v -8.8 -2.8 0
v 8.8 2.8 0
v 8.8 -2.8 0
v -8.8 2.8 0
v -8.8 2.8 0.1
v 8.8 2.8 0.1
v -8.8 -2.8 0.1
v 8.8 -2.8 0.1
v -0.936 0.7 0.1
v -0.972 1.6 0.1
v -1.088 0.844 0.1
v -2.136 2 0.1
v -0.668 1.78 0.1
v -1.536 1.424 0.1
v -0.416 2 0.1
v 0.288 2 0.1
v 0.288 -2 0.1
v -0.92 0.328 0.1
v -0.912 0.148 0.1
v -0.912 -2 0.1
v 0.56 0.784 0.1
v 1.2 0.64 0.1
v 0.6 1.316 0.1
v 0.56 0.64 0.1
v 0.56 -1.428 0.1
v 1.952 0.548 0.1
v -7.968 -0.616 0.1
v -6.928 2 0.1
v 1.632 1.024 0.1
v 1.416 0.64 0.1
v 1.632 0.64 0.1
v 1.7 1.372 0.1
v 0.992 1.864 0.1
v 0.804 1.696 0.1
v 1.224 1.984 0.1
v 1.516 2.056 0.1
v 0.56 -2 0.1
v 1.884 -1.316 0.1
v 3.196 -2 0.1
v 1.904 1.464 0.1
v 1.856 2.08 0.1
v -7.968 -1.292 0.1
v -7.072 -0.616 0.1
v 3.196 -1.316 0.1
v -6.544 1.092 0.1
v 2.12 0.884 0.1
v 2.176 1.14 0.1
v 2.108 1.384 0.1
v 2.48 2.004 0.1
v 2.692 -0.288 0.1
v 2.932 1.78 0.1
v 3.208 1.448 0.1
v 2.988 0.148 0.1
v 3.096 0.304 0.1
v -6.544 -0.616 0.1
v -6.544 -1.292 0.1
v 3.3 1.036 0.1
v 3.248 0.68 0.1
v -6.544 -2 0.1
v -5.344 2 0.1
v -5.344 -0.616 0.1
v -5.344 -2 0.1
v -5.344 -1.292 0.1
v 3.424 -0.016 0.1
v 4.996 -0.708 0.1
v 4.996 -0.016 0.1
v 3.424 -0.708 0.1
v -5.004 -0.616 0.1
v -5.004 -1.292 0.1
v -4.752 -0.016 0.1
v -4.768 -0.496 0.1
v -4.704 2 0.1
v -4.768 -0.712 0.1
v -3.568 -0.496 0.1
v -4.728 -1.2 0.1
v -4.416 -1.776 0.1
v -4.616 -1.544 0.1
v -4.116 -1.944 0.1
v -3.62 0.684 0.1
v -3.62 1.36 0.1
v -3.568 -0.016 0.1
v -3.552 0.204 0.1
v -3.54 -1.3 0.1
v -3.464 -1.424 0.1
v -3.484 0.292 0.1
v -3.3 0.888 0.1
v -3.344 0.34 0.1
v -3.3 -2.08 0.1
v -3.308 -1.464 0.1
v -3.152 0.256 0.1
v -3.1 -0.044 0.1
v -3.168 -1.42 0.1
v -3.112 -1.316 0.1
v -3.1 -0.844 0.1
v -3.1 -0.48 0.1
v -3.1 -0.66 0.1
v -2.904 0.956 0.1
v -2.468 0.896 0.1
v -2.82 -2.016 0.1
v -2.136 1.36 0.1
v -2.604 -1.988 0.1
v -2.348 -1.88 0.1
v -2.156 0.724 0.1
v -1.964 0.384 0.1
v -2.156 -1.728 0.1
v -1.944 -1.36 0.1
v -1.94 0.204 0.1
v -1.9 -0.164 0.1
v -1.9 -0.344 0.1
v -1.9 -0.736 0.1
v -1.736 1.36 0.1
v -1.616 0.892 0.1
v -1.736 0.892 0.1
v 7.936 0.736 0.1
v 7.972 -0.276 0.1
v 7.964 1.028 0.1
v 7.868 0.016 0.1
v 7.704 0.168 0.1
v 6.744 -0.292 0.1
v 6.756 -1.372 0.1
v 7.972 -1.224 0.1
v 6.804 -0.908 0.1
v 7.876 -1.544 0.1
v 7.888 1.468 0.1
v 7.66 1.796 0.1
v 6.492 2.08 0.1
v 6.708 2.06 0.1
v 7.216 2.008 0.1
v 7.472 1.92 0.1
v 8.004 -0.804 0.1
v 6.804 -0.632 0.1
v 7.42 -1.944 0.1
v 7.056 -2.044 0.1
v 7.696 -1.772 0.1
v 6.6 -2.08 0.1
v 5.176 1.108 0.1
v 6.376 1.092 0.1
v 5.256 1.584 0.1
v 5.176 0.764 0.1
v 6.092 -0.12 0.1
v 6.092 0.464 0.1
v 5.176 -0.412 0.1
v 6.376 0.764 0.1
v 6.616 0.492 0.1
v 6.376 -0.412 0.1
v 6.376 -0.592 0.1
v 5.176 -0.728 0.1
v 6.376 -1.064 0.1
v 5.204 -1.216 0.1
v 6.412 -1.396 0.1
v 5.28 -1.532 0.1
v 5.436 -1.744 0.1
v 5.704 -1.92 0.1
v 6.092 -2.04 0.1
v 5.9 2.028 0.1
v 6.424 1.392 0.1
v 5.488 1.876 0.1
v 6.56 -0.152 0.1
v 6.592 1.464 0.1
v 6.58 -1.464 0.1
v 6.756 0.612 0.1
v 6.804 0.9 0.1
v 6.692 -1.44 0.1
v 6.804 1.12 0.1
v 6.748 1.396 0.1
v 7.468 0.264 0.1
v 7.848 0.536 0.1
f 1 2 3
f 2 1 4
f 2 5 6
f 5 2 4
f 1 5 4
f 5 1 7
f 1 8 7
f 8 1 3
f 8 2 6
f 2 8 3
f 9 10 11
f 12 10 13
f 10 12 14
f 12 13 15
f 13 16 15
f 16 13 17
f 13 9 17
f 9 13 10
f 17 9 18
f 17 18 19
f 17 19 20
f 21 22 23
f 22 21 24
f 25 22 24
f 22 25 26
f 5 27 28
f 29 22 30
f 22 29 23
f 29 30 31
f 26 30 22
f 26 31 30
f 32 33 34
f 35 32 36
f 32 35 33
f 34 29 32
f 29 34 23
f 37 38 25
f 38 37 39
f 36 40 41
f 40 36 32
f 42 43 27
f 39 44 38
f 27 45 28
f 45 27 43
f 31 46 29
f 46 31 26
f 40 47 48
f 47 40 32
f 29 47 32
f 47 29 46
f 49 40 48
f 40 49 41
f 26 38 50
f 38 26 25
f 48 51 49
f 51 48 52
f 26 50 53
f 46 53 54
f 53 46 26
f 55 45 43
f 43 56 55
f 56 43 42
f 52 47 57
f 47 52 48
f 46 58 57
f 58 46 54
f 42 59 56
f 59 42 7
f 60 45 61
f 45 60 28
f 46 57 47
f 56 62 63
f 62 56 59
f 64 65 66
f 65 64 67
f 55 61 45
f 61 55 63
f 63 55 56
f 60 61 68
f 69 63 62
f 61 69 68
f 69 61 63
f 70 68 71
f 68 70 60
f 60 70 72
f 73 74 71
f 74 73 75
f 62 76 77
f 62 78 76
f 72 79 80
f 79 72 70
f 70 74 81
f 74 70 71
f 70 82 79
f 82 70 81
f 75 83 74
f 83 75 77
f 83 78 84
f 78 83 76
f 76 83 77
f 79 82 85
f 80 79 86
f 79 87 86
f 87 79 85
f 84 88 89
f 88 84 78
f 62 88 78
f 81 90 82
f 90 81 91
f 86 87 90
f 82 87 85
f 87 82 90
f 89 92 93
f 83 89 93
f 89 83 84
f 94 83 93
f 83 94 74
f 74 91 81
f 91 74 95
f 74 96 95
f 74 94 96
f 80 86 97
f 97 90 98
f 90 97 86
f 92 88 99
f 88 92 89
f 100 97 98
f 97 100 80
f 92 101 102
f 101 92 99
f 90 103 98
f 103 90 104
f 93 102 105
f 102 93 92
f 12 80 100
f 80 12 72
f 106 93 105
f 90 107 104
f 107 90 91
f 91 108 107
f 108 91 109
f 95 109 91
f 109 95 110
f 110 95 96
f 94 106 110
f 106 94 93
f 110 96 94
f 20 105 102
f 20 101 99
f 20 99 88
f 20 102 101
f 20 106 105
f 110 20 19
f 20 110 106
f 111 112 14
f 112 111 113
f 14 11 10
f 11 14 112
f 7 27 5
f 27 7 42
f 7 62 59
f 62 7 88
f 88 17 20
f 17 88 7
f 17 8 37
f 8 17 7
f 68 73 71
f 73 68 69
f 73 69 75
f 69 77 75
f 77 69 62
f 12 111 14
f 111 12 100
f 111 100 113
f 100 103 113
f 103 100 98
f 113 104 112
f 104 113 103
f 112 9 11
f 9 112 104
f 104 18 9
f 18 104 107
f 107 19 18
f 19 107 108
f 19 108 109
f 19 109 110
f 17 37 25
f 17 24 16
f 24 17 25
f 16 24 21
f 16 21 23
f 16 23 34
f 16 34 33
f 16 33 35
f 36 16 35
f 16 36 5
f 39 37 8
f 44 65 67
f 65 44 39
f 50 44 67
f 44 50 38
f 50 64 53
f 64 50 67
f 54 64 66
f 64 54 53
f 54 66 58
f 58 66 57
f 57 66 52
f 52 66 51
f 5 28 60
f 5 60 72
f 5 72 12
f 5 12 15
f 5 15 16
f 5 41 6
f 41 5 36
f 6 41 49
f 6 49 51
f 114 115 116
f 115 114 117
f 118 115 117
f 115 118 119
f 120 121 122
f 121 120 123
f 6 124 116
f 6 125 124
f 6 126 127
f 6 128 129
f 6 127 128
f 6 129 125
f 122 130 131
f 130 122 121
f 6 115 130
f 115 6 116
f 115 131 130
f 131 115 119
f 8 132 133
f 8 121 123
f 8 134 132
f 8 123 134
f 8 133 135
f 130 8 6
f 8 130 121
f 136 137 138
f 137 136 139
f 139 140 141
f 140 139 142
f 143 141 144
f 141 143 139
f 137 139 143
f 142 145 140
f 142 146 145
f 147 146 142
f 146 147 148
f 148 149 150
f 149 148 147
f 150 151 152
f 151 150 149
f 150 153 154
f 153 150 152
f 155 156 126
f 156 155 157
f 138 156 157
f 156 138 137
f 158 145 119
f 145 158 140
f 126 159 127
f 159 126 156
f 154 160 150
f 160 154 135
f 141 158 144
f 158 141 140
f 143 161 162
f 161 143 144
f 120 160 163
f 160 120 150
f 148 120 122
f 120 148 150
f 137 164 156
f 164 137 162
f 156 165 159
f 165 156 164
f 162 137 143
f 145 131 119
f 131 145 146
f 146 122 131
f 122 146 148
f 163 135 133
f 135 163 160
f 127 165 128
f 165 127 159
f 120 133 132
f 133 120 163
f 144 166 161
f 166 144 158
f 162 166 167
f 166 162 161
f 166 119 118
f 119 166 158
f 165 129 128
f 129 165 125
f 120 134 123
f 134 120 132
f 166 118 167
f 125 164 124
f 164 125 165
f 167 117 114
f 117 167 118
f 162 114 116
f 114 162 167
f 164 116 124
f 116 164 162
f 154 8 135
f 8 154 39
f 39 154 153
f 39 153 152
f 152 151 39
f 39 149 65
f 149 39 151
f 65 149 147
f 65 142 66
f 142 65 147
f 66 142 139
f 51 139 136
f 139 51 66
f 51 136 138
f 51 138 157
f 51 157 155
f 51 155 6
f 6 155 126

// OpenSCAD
// file: ../p/box5-12.scad
use <../lib.scad>
function ldraw_lib__box5_12() = [
// 0 Box with 5 Faces without Any Edges
// 0 Name: box5-12.dat
// 0 Author: Chris Dee [cwdee]
// 0 !LDRAW_ORG Primitive UPDATE 2009-02
// 0 !LICENSE Licensed under CC BY 4.0 : see CAreadme.txt
// 
// 0 BFC CERTIFY CCW
  [0,"BFC","CERTIFY"],
  [0,"BFC","CCW"],
// 
// 0 !HISTORY 2009-09-03 [PTadmin] Official Update 2009-02
// 
// 
// 4 16 1 1 1 1 1 -1 -1 1 -1 -1 1 1
  [4,16,1,1,1,1,1,-1,-1,1,-1,-1,1,1],
// 4 16 -1 0 1 1 0 1 1 1 1 -1 1 1
  [4,16,-1,0,1,1,0,1,1,1,1,-1,1,1],
// 4 16 -1 0 -1 -1 0 1 -1 1 1 -1 1 -1
  [4,16,-1,0,-1,-1,0,1,-1,1,1,-1,1,-1],
// 4 16 1 0 -1 -1 0 -1 -1 1 -1 1 1 -1
  [4,16,1,0,-1,-1,0,-1,-1,1,-1,1,1,-1],
// 4 16 1 0 1 1 0 -1 1 1 -1 1 1 1
  [4,16,1,0,1,1,0,-1,1,1,-1,1,1,1],
// 0
];
module ldraw_lib__box5_12(step=0, col=false, unit=2/5, alt=false, line=0.2, solid=!$preview)
    makepoly(ldraw_lib__box5_12(), step=step, col=col, unit=unit, alt=alt, line=line, solid=solid);
ldraw_lib__box5_12(line=0.2);
// main file
use <../lib.scad>
use <s/4201639hs01.scad>
function ldraw_lib__4201639j() = [
// 0 Sticker  0.7 x  2.2 with White "4512-3" on Black Background
// 0 Name: 4201639j.dat
// 0 Author: Gerald Lasser [GeraldLasser]
// 0 !LDRAW_ORG Part UPDATE 2024-04
// 0 !LICENSE Licensed under CC BY 4.0 : see CAreadme.txt
// 
// 0 BFC CERTIFY CCW
  [0,"BFC","CERTIFY"],
  [0,"BFC","CCW"],
// 
// 0 !KEYWORDS Set 4512
// 
// 0 !HISTORY 2024-05-28 [OrionP] Official Update 2024-04
// 
// 
// 1 16 0 0 0 1 0 0 0 1 0 0 0 1 s\4201639hs01.dat
  [1,16,0,0,0,1,0,0,0,1,0,0,0,1, ldraw_lib__s__4201639hs01()],
// 
// 0 // Digit 3
// 4 0 19.91 -.25 2.57 19.84 -.25 1.84 19.67 -.25 .04 19.93 -.25 -.69
  [4,0,19.91,-.25,2.57,19.84,-.25,1.84,19.67,-.25,.04,19.93,-.25,-.69],
// 4 15 19.26 -.25 .42 16.86 -.25 -.73 19.93 -.25 -.69 19.67 -.25 .04
  [4,15,19.26,-.25,.42,16.86,-.25,-.73,19.93,-.25,-.69,19.67,-.25,.04],
// 4 15 19.69 -.25 -3.86 19.93 -.25 -3.06 17.01 -.25 -2.27 16.89 -.25 -3.43
  [4,15,19.69,-.25,-3.86,19.93,-.25,-3.06,17.01,-.25,-2.27,16.89,-.25,-3.43],
// 3 0 22 -.25 7 19.72 -.25 3.67 19.91 -.25 2.57
  [3,0,22,-.25,7,19.72,-.25,3.67,19.91,-.25,2.57],
// 3 0 22 -.25 7 19.15 -.25 4.49 19.72 -.25 3.67
  [3,0,22,-.25,7,19.15,-.25,4.49,19.72,-.25,3.67],
// 3 0 22 -.25 7 16.23 -.25 5.2 16.77 -.25 5.15
  [3,0,22,-.25,7,16.23,-.25,5.2,16.77,-.25,5.15],
// 3 0 22 -.25 7 18.04 -.25 5.02 18.68 -.25 4.8
  [3,0,22,-.25,7,18.04,-.25,5.02,18.68,-.25,4.8],
// 3 0 22 -.25 7 16.77 -.25 5.15 18.04 -.25 5.02
  [3,0,22,-.25,7,16.77,-.25,5.15,18.04,-.25,5.02],
// 3 0 22 -.25 7 18.68 -.25 4.8 19.15 -.25 4.49
  [3,0,22,-.25,7,18.68,-.25,4.8,19.15,-.25,4.49],
// 4 15 17.01 -.25 -1.58 17.01 -.25 -2.27 19.93 -.25 -3.06 20.01 -.25 -2.01
  [4,15,17.01,-.25,-1.58,17.01,-.25,-2.27,19.93,-.25,-3.06,20.01,-.25,-2.01],
// 4 0 19.93 -.25 -.69 20.01 -.25 -2.01 22 -.25 7 19.91 -.25 2.57
  [4,0,19.93,-.25,-.69,20.01,-.25,-2.01,22,-.25,7,19.91,-.25,2.57],
// 4 15 16.86 -.25 -.73 17.01 -.25 -1.58 20.01 -.25 -2.01 19.93 -.25 -.69
  [4,15,16.86,-.25,-.73,17.01,-.25,-1.58,20.01,-.25,-2.01,19.93,-.25,-.69],
// 3 0 22 -.25 -7 18.55 -.25 -4.86 17.64 -.25 -5.11
  [3,0,22,-.25,-7,18.55,-.25,-4.86,17.64,-.25,-5.11],
// 3 0 22 -.25 -7 19.93 -.25 -3.06 19.69 -.25 -3.86
  [3,0,22,-.25,-7,19.93,-.25,-3.06,19.69,-.25,-3.86],
// 3 0 22 -.25 -7 19.24 -.25 -4.43 18.55 -.25 -4.86
  [3,0,22,-.25,-7,19.24,-.25,-4.43,18.55,-.25,-4.86],
// 3 0 22 -.25 -7 19.69 -.25 -3.86 19.24 -.25 -4.43
  [3,0,22,-.25,-7,19.69,-.25,-3.86,19.24,-.25,-4.43],
// 3 0 22 -.25 -7 17.64 -.25 -5.11 16.5 -.25 -5.2
  [3,0,22,-.25,-7,17.64,-.25,-5.11,16.5,-.25,-5.2],
// 4 0 22 -.25 7 20.01 -.25 -2.01 19.93 -.25 -3.06 22 -.25 -7
  [4,0,22,-.25,7,20.01,-.25,-2.01,19.93,-.25,-3.06,22,-.25,-7],
// 4 15 15.94 -.25 2.73 13.14 -.25 3.96 12.94 -.25 2.77 12.94 -.25 1.91
  [4,15,15.94,-.25,2.73,13.14,-.25,3.96,12.94,-.25,2.77,12.94,-.25,1.91],
// 4 0 12.94 -.25 -1.03 15.23 -.25 -.3 15.23 -.25 1.16 12.94 -.25 1.91
  [4,0,12.94,-.25,-1.03,15.23,-.25,-.3,15.23,-.25,1.16,12.94,-.25,1.91],
// 4 0 16.54 -.25 1.23 15.94 -.25 1.91 12.94 -.25 1.91 15.23 -.25 1.16
  [4,0,16.54,-.25,1.23,15.94,-.25,1.91,12.94,-.25,1.91,15.23,-.25,1.16],
// 3 15 15.94 -.25 2.73 12.94 -.25 1.91 15.94 -.25 1.91
  [3,15,15.94,-.25,2.73,12.94,-.25,1.91,15.94,-.25,1.91],
// 3 0 12.94 -.25 -1.03 15.94 -.25 -1.03 15.23 -.25 -.3
  [3,0,12.94,-.25,-1.03,15.94,-.25,-1.03,15.23,-.25,-.3],
// 3 15 12.94 -.25 -1.03 15.94 -.25 -1.48 15.94 -.25 -1.03
  [3,15,12.94,-.25,-1.03,15.94,-.25,-1.48,15.94,-.25,-1.03],
// 4 15 15.94 -.25 -1.48 12.94 -.25 -1.03 12.94 -.25 -1.82 15.94 -.25 -2.66
  [4,15,15.94,-.25,-1.48,12.94,-.25,-1.03,12.94,-.25,-1.82,15.94,-.25,-2.66],
// 4 15 12.94 -.25 -1.82 13.01 -.25 -3.04 16.03 -.25 -3.49 15.94 -.25 -2.66
  [4,15,12.94,-.25,-1.82,13.01,-.25,-3.04,16.03,-.25,-3.49,15.94,-.25,-2.66],
// 4 15 13.59 -.25 -4.36 16.03 -.25 -3.49 13.01 -.25 -3.04 13.2 -.25 -3.83
  [4,15,13.59,-.25,-4.36,16.03,-.25,-3.49,13.01,-.25,-3.04,13.2,-.25,-3.83],
// 4 15 13.59 -.25 -4.36 14.26 -.25 -4.8 15.23 -.25 -5.1 16.03 -.25 -3.49
  [4,15,13.59,-.25,-4.36,14.26,-.25,-4.8,15.23,-.25,-5.1,16.03,-.25,-3.49],
// 4 15 16.23 -.25 5.2 14.75 -.25 5.07 13.72 -.25 4.69 16.06 -.25 3.48
  [4,15,16.23,-.25,5.2,14.75,-.25,5.07,13.72,-.25,4.69,16.06,-.25,3.48],
// 4 15 15.94 -.25 2.73 16.06 -.25 3.48 13.72 -.25 4.69 13.14 -.25 3.96
  [4,15,15.94,-.25,2.73,16.06,-.25,3.48,13.72,-.25,4.69,13.14,-.25,3.96],
// 4 0 16.86 -.25 -.73 16.4 -.25 -.38 15.23 -.25 -.3 15.94 -.25 -1.03
  [4,0,16.86,-.25,-.73,16.4,-.25,-.38,15.23,-.25,-.3,15.94,-.25,-1.03],
// 4 15 16.77 -.25 5.15 16.23 -.25 5.2 16.06 -.25 3.48 16.48 -.25 3.66
  [4,15,16.77,-.25,5.15,16.23,-.25,5.2,16.06,-.25,3.48,16.48,-.25,3.66],
// 4 15 16.03 -.25 -3.49 15.23 -.25 -5.1 16.5 -.25 -5.2 16.45 -.25 -3.66
  [4,15,16.03,-.25,-3.49,15.23,-.25,-5.1,16.5,-.25,-5.2,16.45,-.25,-3.66],
// 4 15 15.23 -.25 1.16 15.23 -.25 -.3 16.4 -.25 -.38 16.54 -.25 1.23
  [4,15,15.23,-.25,1.16,15.23,-.25,-.3,16.4,-.25,-.38,16.54,-.25,1.23],
// 4 0 17.01 -.25 2.25 15.94 -.25 1.91 16.54 -.25 1.23 16.89 -.25 1.53
  [4,0,17.01,-.25,2.25,15.94,-.25,1.91,16.54,-.25,1.23,16.89,-.25,1.53],
// 4 0 16.73 -.25 -3.6 16.89 -.25 -3.43 16.03 -.25 -3.49 16.45 -.25 -3.66
  [4,0,16.73,-.25,-3.6,16.89,-.25,-3.43,16.03,-.25,-3.49,16.45,-.25,-3.66],
// 4 0 17.01 -.25 -2.27 15.94 -.25 -2.66 16.03 -.25 -3.49 16.89 -.25 -3.43
  [4,0,17.01,-.25,-2.27,15.94,-.25,-2.66,16.03,-.25,-3.49,16.89,-.25,-3.43],
// 4 0 17.01 -.25 2.25 17.01 -.25 2.8 16.06 -.25 3.48 15.94 -.25 2.73
  [4,0,17.01,-.25,2.25,17.01,-.25,2.8,16.06,-.25,3.48,15.94,-.25,2.73],
// 4 0 16.48 -.25 3.66 16.06 -.25 3.48 17.01 -.25 2.8 16.87 -.25 3.49
  [4,0,16.48,-.25,3.66,16.06,-.25,3.48,17.01,-.25,2.8,16.87,-.25,3.49],
// 3 0 17.01 -.25 2.25 15.94 -.25 2.73 15.94 -.25 1.91
  [3,0,17.01,-.25,2.25,15.94,-.25,2.73,15.94,-.25,1.91],
// 4 0 16.86 -.25 -.73 15.94 -.25 -1.03 15.94 -.25 -1.48 17.01 -.25 -1.58
  [4,0,16.86,-.25,-.73,15.94,-.25,-1.03,15.94,-.25,-1.48,17.01,-.25,-1.58],
// 4 0 15.94 -.25 -2.66 17.01 -.25 -2.27 17.01 -.25 -1.58 15.94 -.25 -1.48
  [4,0,15.94,-.25,-2.66,17.01,-.25,-2.27,17.01,-.25,-1.58,15.94,-.25,-1.48],
// 4 15 16.45 -.25 -3.66 16.5 -.25 -5.2 17.64 -.25 -5.11 16.73 -.25 -3.6
  [4,15,16.45,-.25,-3.66,16.5,-.25,-5.2,17.64,-.25,-5.11,16.73,-.25,-3.6],
// 4 15 16.48 -.25 3.66 16.87 -.25 3.49 18.04 -.25 5.02 16.77 -.25 5.15
  [4,15,16.48,-.25,3.66,16.87,-.25,3.49,18.04,-.25,5.02,16.77,-.25,5.15],
// 4 15 16.73 -.25 -3.6 17.64 -.25 -5.11 18.55 -.25 -4.86 16.89 -.25 -3.43
  [4,15,16.73,-.25,-3.6,17.64,-.25,-5.11,18.55,-.25,-4.86,16.89,-.25,-3.43],
// 4 15 16.4 -.25 -.38 18.67 -.25 .66 16.89 -.25 1.53 16.54 -.25 1.23
  [4,15,16.4,-.25,-.38,18.67,-.25,.66,16.89,-.25,1.53,16.54,-.25,1.23],
// 4 15 19.62 -.25 1.34 17.01 -.25 2.25 16.89 -.25 1.53 18.67 -.25 .66
  [4,15,19.62,-.25,1.34,17.01,-.25,2.25,16.89,-.25,1.53,18.67,-.25,.66],
// 4 15 19.26 -.25 .42 18.67 -.25 .66 16.4 -.25 -.38 16.86 -.25 -.73
  [4,15,19.26,-.25,.42,18.67,-.25,.66,16.4,-.25,-.38,16.86,-.25,-.73],
// 4 15 19.15 -.25 4.49 18.68 -.25 4.8 18.04 -.25 5.02 16.87 -.25 3.49
  [4,15,19.15,-.25,4.49,18.68,-.25,4.8,18.04,-.25,5.02,16.87,-.25,3.49],
// 4 15 19.69 -.25 -3.86 16.89 -.25 -3.43 18.55 -.25 -4.86 19.24 -.25 -4.43
  [4,15,19.69,-.25,-3.86,16.89,-.25,-3.43,18.55,-.25,-4.86,19.24,-.25,-4.43],
// 3 0 18.67 -.25 .66 19.26 -.25 .42 19.62 -.25 1.34
  [3,0,18.67,-.25,.66,19.26,-.25,.42,19.62,-.25,1.34],
// 4 15 17.01 -.25 2.8 19.72 -.25 3.67 19.15 -.25 4.49 16.87 -.25 3.49
  [4,15,17.01,-.25,2.8,19.72,-.25,3.67,19.15,-.25,4.49,16.87,-.25,3.49],
// 4 0 19.26 -.25 .42 19.67 -.25 .04 19.84 -.25 1.84 19.62 -.25 1.34
  [4,0,19.26,-.25,.42,19.67,-.25,.04,19.84,-.25,1.84,19.62,-.25,1.34],
// 4 15 19.91 -.25 2.57 17.01 -.25 2.25 19.62 -.25 1.34 19.84 -.25 1.84
  [4,15,19.91,-.25,2.57,17.01,-.25,2.25,19.62,-.25,1.34,19.84,-.25,1.84],
// 4 15 17.01 -.25 2.25 19.91 -.25 2.57 19.72 -.25 3.67 17.01 -.25 2.8
  [4,15,17.01,-.25,2.25,19.91,-.25,2.57,19.72,-.25,3.67,17.01,-.25,2.8],
// 4 0 7.99 -.25 -5 22 -.25 -7 16.5 -.25 -5.2 15.23 -.25 -5.1
  [4,0,7.99,-.25,-5,22,-.25,-7,16.5,-.25,-5.2,15.23,-.25,-5.1],
// 3 0 7.99 -.25 -5 15.23 -.25 -5.1 14.26 -.25 -4.8
  [3,0,7.99,-.25,-5,15.23,-.25,-5.1,14.26,-.25,-4.8],
// 3 0 7.99 -.25 -5 14.26 -.25 -4.8 13.59 -.25 -4.36
  [3,0,7.99,-.25,-5,14.26,-.25,-4.8,13.59,-.25,-4.36],
// 3 0 13.59 -.25 -4.36 13.2 -.25 -3.83 7.99 -.25 -5
  [3,0,13.59,-.25,-4.36,13.2,-.25,-3.83,7.99,-.25,-5],
// 4 0 13.2 -.25 -3.83 13.01 -.25 -3.04 12.49 -.25 -1.77 7.99 -.25 -5
  [4,0,13.2,-.25,-3.83,13.01,-.25,-3.04,12.49,-.25,-1.77,7.99,-.25,-5],
// 3 0 12.49 -.25 -1.77 13.01 -.25 -3.04 12.94 -.25 -1.82
  [3,0,12.49,-.25,-1.77,13.01,-.25,-3.04,12.94,-.25,-1.82],
// 4 0 12.49 -.25 -.04 12.49 -.25 -1.77 12.94 -.25 -1.82 12.94 -.25 -1.03
  [4,0,12.49,-.25,-.04,12.49,-.25,-1.77,12.94,-.25,-1.82,12.94,-.25,-1.03],
// 3 0 12.49 -.25 -.04 12.94 -.25 -1.03 12.94 -.25 1.91
  [3,0,12.49,-.25,-.04,12.94,-.25,-1.03,12.94,-.25,1.91],
// 4 0 12.94 -.25 2.77 7.33 -.25 4.45 12.49 -.25 -.04 12.94 -.25 1.91
  [4,0,12.94,-.25,2.77,7.33,-.25,4.45,12.49,-.25,-.04,12.94,-.25,1.91],
// 3 0 7.33 -.25 4.45 12.94 -.25 2.77 13.14 -.25 3.96
  [3,0,7.33,-.25,4.45,12.94,-.25,2.77,13.14,-.25,3.96],
// 3 0 7.33 -.25 4.45 13.14 -.25 3.96 13.72 -.25 4.69
  [3,0,7.33,-.25,4.45,13.14,-.25,3.96,13.72,-.25,4.69],
// 3 0 7.33 -.25 4.45 13.72 -.25 4.69 14.75 -.25 5.07
  [3,0,7.33,-.25,4.45,13.72,-.25,4.69,14.75,-.25,5.07],
// 3 0 7.33 -.25 4.45 14.75 -.25 5.07 22 -.25 7
  [3,0,7.33,-.25,4.45,14.75,-.25,5.07,22,-.25,7],
// 3 0 22 -.25 7 14.75 -.25 5.07 16.23 -.25 5.2
  [3,0,22,-.25,7,14.75,-.25,5.07,16.23,-.25,5.2],
];
module ldraw_lib__4201639j(step=0, col=false, unit=2/5, alt=false, line=0.2, solid=!$preview)
    makepoly(ldraw_lib__4201639j(), step=step, col=col, unit=unit, alt=alt, line=line, solid=solid);
ldraw_lib__4201639j(line=0.2);
